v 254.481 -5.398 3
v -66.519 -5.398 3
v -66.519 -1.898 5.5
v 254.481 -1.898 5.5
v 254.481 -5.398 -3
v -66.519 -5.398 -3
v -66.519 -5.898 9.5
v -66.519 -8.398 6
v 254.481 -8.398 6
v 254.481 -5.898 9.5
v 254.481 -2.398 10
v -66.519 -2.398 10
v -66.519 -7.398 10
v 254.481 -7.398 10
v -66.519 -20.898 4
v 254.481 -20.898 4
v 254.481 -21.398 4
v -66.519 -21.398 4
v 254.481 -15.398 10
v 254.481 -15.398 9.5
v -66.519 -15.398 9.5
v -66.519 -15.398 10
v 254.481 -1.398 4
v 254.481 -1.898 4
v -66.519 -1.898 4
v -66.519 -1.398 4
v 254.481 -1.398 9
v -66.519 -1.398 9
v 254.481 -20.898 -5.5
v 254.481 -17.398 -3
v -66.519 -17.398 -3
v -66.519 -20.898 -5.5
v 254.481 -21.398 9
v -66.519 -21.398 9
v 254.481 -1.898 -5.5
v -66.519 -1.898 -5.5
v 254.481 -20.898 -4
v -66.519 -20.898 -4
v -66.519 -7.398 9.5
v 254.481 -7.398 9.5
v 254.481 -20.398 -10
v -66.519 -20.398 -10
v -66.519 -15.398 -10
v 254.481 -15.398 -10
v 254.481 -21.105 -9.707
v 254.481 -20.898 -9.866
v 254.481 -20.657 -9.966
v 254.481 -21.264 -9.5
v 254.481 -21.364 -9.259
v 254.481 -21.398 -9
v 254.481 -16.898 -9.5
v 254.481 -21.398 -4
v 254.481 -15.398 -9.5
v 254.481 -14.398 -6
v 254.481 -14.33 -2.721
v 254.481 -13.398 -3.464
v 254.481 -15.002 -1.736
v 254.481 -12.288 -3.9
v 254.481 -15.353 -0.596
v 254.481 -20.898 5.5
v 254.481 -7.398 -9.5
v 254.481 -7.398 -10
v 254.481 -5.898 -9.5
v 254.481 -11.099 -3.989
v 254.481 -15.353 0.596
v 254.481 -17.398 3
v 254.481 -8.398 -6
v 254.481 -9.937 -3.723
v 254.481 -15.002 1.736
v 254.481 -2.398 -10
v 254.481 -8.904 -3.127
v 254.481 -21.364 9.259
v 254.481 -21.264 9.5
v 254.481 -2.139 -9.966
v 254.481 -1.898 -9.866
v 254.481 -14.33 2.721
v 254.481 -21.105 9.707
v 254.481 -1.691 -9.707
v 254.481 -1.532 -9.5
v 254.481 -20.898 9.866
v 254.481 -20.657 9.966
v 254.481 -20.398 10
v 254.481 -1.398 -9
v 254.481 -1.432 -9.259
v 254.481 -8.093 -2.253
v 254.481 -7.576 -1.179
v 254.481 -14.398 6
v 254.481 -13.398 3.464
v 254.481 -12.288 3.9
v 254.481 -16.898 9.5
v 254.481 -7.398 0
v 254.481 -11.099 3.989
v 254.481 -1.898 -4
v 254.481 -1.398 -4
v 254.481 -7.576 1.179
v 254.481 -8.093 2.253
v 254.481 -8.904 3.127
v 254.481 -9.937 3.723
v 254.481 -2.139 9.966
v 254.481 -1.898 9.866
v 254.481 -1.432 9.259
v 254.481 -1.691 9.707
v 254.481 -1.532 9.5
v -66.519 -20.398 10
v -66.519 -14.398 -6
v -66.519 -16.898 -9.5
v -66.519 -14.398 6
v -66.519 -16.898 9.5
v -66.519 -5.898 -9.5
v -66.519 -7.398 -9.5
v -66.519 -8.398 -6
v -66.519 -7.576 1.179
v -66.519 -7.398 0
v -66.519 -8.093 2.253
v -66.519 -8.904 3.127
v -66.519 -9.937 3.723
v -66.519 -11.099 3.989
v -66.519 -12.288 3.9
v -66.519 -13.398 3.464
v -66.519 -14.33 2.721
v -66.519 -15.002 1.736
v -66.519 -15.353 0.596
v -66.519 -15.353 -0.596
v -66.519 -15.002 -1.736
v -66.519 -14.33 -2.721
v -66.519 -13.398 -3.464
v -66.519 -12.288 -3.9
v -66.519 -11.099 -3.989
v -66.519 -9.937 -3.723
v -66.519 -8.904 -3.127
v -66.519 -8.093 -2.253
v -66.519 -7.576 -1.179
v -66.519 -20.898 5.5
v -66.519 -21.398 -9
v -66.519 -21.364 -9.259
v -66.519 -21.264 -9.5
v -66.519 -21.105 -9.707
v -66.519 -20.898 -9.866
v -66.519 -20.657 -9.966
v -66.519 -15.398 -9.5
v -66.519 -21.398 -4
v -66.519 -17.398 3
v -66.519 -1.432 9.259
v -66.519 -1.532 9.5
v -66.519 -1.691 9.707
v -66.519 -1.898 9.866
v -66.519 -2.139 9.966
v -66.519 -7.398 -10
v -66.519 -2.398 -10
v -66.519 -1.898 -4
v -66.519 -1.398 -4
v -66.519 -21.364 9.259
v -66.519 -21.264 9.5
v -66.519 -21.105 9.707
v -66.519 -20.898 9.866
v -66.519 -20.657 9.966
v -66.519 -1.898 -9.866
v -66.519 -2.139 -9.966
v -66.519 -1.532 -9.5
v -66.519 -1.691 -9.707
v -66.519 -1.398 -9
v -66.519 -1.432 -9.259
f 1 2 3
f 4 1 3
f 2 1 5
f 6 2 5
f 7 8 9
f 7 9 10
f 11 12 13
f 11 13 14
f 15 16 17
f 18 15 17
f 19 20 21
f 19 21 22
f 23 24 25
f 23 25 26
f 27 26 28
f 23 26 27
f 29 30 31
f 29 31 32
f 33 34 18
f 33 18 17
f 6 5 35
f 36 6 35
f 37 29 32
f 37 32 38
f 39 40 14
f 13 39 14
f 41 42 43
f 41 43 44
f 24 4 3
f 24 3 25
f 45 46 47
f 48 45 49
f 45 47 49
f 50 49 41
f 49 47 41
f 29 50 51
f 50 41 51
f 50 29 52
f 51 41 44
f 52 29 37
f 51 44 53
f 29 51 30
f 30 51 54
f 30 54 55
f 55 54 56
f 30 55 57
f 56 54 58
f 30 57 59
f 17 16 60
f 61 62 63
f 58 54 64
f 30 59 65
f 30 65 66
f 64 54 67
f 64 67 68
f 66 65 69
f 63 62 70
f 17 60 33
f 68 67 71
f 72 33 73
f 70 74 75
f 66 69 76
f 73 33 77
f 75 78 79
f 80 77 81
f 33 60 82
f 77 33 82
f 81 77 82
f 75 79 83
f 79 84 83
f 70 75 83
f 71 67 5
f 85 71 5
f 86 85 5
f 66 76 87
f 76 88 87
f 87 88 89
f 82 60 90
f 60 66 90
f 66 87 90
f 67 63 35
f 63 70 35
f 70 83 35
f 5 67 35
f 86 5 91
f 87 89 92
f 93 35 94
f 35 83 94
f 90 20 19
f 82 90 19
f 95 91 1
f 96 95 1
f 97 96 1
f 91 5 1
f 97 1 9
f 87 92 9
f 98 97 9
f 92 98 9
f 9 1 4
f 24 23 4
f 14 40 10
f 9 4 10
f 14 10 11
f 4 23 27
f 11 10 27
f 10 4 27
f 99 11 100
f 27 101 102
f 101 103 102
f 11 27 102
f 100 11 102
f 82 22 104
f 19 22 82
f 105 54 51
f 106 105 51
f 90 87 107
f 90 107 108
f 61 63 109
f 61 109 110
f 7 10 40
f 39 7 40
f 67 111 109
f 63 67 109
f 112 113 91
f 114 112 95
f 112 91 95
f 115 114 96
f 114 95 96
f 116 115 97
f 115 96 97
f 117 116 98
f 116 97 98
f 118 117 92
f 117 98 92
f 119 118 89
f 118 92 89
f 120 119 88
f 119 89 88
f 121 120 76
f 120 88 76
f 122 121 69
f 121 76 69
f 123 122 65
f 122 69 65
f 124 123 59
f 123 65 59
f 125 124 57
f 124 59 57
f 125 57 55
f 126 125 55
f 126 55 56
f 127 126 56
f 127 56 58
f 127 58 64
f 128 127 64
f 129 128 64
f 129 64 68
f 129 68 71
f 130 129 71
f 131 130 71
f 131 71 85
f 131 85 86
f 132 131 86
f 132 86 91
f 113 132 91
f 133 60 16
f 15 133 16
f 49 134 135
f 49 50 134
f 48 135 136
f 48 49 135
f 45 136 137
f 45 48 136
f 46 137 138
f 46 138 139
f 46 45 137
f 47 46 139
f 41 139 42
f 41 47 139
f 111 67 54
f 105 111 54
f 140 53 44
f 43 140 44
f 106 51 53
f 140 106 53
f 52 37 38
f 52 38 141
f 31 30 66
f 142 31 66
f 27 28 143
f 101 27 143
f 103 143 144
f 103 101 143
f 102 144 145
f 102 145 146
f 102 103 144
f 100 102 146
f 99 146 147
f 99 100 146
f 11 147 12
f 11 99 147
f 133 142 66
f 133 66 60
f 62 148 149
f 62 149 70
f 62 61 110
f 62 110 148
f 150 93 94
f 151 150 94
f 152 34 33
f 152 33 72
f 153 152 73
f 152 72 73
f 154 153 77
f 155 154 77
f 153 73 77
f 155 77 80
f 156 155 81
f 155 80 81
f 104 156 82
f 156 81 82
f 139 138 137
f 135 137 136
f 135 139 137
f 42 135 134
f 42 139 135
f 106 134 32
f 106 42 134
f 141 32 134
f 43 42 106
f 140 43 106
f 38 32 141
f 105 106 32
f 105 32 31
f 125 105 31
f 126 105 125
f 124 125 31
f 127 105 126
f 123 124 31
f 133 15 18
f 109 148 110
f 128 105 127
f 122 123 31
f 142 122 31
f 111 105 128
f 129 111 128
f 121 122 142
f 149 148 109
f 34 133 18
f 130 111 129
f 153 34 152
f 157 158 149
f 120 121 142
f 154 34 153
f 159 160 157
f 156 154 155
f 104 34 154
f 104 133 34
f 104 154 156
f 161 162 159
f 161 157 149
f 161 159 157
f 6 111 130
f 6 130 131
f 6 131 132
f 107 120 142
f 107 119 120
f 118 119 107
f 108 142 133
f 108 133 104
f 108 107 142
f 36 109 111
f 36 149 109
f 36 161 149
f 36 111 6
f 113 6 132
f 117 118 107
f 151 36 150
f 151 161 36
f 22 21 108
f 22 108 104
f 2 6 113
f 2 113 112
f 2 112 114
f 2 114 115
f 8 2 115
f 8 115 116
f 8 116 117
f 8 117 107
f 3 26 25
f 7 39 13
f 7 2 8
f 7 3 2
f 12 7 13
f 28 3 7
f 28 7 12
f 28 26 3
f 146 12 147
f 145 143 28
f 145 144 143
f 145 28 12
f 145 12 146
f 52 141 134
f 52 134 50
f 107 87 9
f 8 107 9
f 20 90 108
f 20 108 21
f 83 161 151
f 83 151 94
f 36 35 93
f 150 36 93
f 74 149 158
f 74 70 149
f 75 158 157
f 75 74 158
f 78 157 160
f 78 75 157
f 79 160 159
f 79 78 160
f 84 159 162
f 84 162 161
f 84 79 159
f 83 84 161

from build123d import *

# Parameters (mm, degrees)
SKETCH_1_W                       = 321
SKETCH_1_H                       = 10
EXTRUDE_1_DEPTH                  = 10
SKETCH_2_R                       = 4
CUT_EXTRUDE_1_DEPTH              = 1270
CUT_EXTRUDE_2_DEPTH              = 1270
FILLET_1_R                       = 1
PATTERN_CIRCULAR_2_COUNT         = 4
FILLET_1_OF_PATTERN_CIRCULAR_2_R = 1


with BuildPart() as part:
    # 草图1 → 凸台-拉伸1 (new body)
    with BuildSketch(Plane.XY):
        with Locations((93.981285353, -6.397869645)):
            Rectangle(SKETCH_1_W, SKETCH_1_H)
    extrude_1 = extrude(amount=EXTRUDE_1_DEPTH)

    # 草图2 → 切除-拉伸1 (cut)
    with BuildSketch(Plane(origin=(254.481285353, 0, 0), x_dir=(0, 0, -1), z_dir=(1, 0, 0))):
        with Locations((0, -11.397869645)):
            Circle(SKETCH_2_R)
    cut_extrude_1 = extrude(amount=-CUT_EXTRUDE_1_DEPTH, mode=Mode.SUBTRACT)

    # 草图3 → 切除-拉伸2 (cut)
    with BuildSketch(Plane(origin=(254.481285353, 0, 0), x_dir=(0, 0, -1), z_dir=(1, 0, 0))):
        Polygon((-4, -1.397869645), (0, -1.397869645), (0, -5.397869645), (-3, -5.397869645), (-5.5, -1.897869645), (-4, -1.897869645), align=None)
        Polygon((-10, -7.397869645), (-10, -11.397869645), (-6, -11.397869645), (-6, -8.397869645), (-9.5, -5.897869645), (-9.5, -7.397869645), align=None)
    cut_extrude_2 = extrude(amount=-CUT_EXTRUDE_2_DEPTH, mode=Mode.SUBTRACT)

    # 圆角1
    fillet_1_edges = [part.edges().sort_by_distance(p)[0] for p in [
        (93.981285353, -1.397869645, 10),
    ]]
    fillet(fillet_1_edges, radius=FILLET_1_R)

    # 阵列(圆周)2: 凸台-拉伸1, 切除-拉伸1, 切除-拉伸2 ×4 about axis
    pattern_circular_2_axis = Axis((0, -11.397869645, 0), (1, 0, 0))
    add([extrude_1.rotate(pattern_circular_2_axis, i * 360 / PATTERN_CIRCULAR_2_COUNT) for i in range(1, PATTERN_CIRCULAR_2_COUNT)])
    add([cut_extrude_1.rotate(pattern_circular_2_axis, i * 360 / PATTERN_CIRCULAR_2_COUNT) for i in range(1, PATTERN_CIRCULAR_2_COUNT)], mode=Mode.SUBTRACT)
    add([cut_extrude_2.rotate(pattern_circular_2_axis, i * 360 / PATTERN_CIRCULAR_2_COUNT) for i in range(1, PATTERN_CIRCULAR_2_COUNT)], mode=Mode.SUBTRACT)

    # 圆角1 of 阵列(圆周)2
    fillet_1_of_pattern_circular_2_edges = [part.edges().sort_by_distance(p)[0] for p in [
        (93.981285353, -21.397869645, 10),
        (93.981285353, -21.397869645, -10),
        (93.981285353, -1.397869645, -10),
    ]]
    fillet(fillet_1_of_pattern_circular_2_edges, radius=FILLET_1_OF_PATTERN_CIRCULAR_2_R)


solid = part.part
